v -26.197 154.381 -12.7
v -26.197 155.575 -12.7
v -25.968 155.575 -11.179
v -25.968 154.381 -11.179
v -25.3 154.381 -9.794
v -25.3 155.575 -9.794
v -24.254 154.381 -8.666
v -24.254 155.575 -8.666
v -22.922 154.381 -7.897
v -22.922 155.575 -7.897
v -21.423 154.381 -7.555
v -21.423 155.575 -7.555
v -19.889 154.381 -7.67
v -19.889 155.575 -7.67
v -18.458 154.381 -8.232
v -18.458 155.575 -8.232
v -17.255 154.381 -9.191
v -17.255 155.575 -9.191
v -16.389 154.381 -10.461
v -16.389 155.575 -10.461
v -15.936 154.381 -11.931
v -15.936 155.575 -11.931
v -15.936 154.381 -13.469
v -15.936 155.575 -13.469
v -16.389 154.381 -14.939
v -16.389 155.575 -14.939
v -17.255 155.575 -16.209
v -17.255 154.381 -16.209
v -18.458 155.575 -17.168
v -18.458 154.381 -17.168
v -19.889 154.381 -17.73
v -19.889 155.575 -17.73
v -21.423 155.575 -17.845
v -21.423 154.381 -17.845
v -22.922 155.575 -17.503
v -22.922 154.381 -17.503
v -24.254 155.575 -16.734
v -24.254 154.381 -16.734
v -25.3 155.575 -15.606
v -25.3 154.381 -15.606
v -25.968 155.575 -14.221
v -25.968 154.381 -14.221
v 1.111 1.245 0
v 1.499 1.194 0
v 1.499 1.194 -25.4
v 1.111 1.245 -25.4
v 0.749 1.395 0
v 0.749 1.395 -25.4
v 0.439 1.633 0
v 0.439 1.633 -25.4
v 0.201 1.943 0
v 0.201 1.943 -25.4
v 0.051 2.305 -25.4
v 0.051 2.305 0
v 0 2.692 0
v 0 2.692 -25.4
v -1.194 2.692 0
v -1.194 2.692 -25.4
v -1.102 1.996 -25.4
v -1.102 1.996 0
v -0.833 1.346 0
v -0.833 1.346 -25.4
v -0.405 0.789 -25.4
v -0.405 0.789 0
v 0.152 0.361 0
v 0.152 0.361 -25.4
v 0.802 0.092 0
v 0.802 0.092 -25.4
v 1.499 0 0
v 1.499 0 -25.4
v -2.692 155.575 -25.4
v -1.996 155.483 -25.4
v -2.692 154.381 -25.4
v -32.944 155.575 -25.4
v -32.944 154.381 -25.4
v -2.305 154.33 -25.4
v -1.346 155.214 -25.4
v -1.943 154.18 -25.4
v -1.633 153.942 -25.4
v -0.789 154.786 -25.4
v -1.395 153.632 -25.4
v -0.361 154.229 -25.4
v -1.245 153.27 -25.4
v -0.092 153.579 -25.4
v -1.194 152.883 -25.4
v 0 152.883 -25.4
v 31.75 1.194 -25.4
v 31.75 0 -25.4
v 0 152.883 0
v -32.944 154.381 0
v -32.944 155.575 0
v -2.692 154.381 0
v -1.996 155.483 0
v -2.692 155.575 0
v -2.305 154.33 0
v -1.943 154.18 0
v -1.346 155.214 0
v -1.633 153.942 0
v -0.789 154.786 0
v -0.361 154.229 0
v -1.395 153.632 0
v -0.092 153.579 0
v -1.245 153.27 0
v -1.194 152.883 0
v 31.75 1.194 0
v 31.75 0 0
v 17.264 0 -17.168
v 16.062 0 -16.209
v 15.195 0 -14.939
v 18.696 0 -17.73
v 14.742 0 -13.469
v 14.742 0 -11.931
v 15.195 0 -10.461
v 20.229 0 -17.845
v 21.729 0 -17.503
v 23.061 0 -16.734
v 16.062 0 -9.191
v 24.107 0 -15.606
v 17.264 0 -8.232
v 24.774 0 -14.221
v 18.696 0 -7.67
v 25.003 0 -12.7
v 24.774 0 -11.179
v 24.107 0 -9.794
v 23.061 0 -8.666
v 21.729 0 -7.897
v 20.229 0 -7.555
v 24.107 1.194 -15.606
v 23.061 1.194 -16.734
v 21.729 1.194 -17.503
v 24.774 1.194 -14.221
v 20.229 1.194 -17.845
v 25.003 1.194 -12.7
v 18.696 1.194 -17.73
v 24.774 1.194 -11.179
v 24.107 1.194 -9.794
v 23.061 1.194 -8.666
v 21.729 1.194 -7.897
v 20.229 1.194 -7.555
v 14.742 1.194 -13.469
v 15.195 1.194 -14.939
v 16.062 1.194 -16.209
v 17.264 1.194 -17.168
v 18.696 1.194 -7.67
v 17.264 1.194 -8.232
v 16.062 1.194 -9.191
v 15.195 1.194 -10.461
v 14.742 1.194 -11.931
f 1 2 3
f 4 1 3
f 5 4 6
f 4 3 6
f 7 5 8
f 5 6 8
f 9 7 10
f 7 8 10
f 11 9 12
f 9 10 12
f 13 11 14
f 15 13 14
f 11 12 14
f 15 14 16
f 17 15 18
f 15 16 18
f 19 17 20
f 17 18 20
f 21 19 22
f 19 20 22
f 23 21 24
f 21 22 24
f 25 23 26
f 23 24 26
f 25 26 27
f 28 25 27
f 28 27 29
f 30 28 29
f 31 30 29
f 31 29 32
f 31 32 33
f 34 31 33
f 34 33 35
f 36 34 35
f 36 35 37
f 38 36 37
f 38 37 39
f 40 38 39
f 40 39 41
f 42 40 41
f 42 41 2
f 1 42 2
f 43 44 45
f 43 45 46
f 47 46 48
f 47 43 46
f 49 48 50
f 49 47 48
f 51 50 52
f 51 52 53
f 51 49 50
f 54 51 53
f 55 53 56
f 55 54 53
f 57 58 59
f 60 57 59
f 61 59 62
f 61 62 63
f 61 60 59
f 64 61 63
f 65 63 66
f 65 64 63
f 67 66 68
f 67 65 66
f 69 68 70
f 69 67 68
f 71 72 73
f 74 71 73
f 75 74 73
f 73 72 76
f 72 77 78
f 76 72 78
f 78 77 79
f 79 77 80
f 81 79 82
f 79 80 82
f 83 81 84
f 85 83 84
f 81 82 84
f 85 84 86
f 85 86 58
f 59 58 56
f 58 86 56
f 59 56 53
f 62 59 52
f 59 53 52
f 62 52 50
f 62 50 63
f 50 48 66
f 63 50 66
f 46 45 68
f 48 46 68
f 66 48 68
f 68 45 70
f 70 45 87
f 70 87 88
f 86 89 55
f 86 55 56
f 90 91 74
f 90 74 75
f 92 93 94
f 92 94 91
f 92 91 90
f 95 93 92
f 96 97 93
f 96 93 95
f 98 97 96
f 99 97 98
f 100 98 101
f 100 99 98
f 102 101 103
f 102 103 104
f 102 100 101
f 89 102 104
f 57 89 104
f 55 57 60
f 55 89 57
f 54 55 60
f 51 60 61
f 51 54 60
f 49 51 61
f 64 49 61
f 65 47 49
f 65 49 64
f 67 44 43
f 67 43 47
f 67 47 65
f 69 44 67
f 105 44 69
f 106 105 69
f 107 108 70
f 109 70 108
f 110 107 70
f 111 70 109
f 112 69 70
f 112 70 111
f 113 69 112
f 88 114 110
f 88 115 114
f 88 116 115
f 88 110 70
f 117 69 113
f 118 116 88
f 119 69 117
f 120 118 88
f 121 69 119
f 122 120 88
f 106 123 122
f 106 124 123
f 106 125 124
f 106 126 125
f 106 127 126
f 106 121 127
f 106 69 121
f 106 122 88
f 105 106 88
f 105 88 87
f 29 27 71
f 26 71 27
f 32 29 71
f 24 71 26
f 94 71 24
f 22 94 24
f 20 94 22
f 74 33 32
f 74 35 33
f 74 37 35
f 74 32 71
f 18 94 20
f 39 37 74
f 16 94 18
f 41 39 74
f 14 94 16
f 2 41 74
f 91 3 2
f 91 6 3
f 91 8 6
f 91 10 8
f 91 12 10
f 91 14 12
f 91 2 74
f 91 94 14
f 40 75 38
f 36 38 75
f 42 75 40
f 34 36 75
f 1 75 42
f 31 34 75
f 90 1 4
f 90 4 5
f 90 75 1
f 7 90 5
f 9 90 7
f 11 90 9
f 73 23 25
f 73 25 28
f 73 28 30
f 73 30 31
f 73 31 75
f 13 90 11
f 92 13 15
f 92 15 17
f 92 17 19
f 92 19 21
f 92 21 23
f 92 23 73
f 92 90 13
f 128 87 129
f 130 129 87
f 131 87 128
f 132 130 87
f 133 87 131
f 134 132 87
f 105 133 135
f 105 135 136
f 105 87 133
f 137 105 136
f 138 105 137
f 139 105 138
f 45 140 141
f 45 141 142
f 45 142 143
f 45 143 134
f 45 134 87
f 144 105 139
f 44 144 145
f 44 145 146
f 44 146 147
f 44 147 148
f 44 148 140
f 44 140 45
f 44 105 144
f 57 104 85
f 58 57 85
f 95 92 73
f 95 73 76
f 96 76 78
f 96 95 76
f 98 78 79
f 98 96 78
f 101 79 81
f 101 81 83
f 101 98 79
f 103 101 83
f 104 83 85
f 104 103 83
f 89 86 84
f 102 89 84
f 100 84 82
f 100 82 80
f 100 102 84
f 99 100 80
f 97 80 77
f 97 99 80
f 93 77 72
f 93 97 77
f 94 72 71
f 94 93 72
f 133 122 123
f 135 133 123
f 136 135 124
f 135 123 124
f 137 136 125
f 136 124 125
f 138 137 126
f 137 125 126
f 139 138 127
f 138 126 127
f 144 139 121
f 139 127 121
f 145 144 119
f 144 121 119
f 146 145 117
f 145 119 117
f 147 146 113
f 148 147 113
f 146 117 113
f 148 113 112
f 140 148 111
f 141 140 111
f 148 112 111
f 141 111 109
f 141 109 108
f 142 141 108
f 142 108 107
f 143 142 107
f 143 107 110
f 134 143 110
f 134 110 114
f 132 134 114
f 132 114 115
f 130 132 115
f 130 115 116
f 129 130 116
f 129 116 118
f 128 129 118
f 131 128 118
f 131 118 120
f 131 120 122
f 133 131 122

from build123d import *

# Parameters (mm, degrees)
SKETCH1_W                    = 25.4
SKETCH1_H                    = 155.575
BASE_FLANGE1_DEPTH           = 1.1938
EDGE_FLANGE1_STRIP_W         = 7.7724
EDGE_FLANGE1_STRIP_H         = 1.1938
EDGE_FLANGE1_STRIP_CUT_DEPTH = 25.4
EDGE_FLANGE1_DEPTH           = 25.4
SKETCH11_R                   = 5.159375
CUT_EXTRUDE1_DEPTH           = 162.040474985
EDGE_FLANGE2_STRIP_W         = 7.7724
EDGE_FLANGE2_STRIP_H         = 1.1938
EDGE_FLANGE2_STRIP_CUT_DEPTH = 25.4
EDGE_FLANGE2_DEPTH           = 25.4
SKETCH15_R                   = 5.159375
CUT_EXTRUDE2_DEPTH           = 162.040474985


# Sheet-metal steps are written as plain solids
with BuildPart() as part:
    # Sketch1 → Base-Flange1 (new body)
    with BuildSketch(Plane(origin=(0, 0, 0), x_dir=(0, 0, -1), z_dir=(1, 0, 0))):
        with Locations((12.7, 77.7875)):
            Rectangle(SKETCH1_W, SKETCH1_H)
    extrude(amount=-BASE_FLANGE1_DEPTH)

    # Edge-Flange1 strip (across the edge) → Edge-Flange1 strip cut (cut)
    with BuildSketch(Plane(origin=(-1.1938, 155.575, 0), x_dir=(0, -1, 0), z_dir=(0, 0, -1))):
        with Locations((-1.1938, -0.5969)):
            Rectangle(EDGE_FLANGE1_STRIP_W, EDGE_FLANGE1_STRIP_H)
    extrude(amount=EDGE_FLANGE1_STRIP_CUT_DEPTH, mode=Mode.SUBTRACT)

    # Edge-Flange1 section (across the edge) → Edge-Flange1 (add)
    with BuildSketch(Plane(origin=(-1.1938, 155.575, 0), x_dir=(0, -1, 0), z_dir=(0, 0, -1))):
        with BuildLine():
            Line((0, 1.4986), (0, 31.75))
            Line((0, 31.75), (1.1938, 31.75))
            Line((1.1938, 31.75), (1.1938, 1.4986))
            ThreePointArc((1.1938, 1.4986), (1.632729778, 0.438929778), (2.6924, 0))
            Line((2.6924, 0), (2.6924, -1.1938))
            ThreePointArc((2.6924, -1.1938), (0.788585702, -0.405214298), (0, 1.4986))
        make_face()
    extrude(amount=EDGE_FLANGE1_DEPTH)

    # Sketch11 → Cut-Extrude1 (cut, through all)
    with BuildSketch(Plane(origin=(0, 155.575, 0), x_dir=(1, 0, 0), z_dir=(0, 1, 0))):
        with Locations(Location((-21.03755, 12.7, 0), (0, 0, 180))):
            Circle(SKETCH11_R)
    extrude(amount=-CUT_EXTRUDE1_DEPTH, mode=Mode.SUBTRACT)

    # Edge-Flange2 strip (across the edge) → Edge-Flange2 strip cut (cut)
    with BuildSketch(Plane.YX):
        with Locations((-1.1938, -0.5969)):
            Rectangle(EDGE_FLANGE2_STRIP_W, EDGE_FLANGE2_STRIP_H)
    extrude(amount=EDGE_FLANGE2_STRIP_CUT_DEPTH, mode=Mode.SUBTRACT)

    # Edge-Flange2 section (across the edge) → Edge-Flange2 (add)
    with BuildSketch(Plane.YX):
        with BuildLine():
            Line((0, 1.4986), (0, 31.75))
            Line((0, 31.75), (1.1938, 31.75))
            Line((1.1938, 31.75), (1.1938, 1.4986))
            ThreePointArc((1.1938, 1.4986), (1.632729778, 0.438929778), (2.6924, 0))
            Line((2.6924, 0), (2.6924, -1.1938))
            ThreePointArc((2.6924, -1.1938), (0.788585702, -0.405214298), (0, 1.4986))
        make_face()
    extrude(amount=EDGE_FLANGE2_DEPTH)

    # Sketch15 → Cut-Extrude2 (cut, through all)
    with BuildSketch(Plane.XZ):
        with Locations((19.84375, -12.7)):
            Circle(SKETCH15_R)
    extrude(amount=-CUT_EXTRUDE2_DEPTH, mode=Mode.SUBTRACT)


solid = part.part
